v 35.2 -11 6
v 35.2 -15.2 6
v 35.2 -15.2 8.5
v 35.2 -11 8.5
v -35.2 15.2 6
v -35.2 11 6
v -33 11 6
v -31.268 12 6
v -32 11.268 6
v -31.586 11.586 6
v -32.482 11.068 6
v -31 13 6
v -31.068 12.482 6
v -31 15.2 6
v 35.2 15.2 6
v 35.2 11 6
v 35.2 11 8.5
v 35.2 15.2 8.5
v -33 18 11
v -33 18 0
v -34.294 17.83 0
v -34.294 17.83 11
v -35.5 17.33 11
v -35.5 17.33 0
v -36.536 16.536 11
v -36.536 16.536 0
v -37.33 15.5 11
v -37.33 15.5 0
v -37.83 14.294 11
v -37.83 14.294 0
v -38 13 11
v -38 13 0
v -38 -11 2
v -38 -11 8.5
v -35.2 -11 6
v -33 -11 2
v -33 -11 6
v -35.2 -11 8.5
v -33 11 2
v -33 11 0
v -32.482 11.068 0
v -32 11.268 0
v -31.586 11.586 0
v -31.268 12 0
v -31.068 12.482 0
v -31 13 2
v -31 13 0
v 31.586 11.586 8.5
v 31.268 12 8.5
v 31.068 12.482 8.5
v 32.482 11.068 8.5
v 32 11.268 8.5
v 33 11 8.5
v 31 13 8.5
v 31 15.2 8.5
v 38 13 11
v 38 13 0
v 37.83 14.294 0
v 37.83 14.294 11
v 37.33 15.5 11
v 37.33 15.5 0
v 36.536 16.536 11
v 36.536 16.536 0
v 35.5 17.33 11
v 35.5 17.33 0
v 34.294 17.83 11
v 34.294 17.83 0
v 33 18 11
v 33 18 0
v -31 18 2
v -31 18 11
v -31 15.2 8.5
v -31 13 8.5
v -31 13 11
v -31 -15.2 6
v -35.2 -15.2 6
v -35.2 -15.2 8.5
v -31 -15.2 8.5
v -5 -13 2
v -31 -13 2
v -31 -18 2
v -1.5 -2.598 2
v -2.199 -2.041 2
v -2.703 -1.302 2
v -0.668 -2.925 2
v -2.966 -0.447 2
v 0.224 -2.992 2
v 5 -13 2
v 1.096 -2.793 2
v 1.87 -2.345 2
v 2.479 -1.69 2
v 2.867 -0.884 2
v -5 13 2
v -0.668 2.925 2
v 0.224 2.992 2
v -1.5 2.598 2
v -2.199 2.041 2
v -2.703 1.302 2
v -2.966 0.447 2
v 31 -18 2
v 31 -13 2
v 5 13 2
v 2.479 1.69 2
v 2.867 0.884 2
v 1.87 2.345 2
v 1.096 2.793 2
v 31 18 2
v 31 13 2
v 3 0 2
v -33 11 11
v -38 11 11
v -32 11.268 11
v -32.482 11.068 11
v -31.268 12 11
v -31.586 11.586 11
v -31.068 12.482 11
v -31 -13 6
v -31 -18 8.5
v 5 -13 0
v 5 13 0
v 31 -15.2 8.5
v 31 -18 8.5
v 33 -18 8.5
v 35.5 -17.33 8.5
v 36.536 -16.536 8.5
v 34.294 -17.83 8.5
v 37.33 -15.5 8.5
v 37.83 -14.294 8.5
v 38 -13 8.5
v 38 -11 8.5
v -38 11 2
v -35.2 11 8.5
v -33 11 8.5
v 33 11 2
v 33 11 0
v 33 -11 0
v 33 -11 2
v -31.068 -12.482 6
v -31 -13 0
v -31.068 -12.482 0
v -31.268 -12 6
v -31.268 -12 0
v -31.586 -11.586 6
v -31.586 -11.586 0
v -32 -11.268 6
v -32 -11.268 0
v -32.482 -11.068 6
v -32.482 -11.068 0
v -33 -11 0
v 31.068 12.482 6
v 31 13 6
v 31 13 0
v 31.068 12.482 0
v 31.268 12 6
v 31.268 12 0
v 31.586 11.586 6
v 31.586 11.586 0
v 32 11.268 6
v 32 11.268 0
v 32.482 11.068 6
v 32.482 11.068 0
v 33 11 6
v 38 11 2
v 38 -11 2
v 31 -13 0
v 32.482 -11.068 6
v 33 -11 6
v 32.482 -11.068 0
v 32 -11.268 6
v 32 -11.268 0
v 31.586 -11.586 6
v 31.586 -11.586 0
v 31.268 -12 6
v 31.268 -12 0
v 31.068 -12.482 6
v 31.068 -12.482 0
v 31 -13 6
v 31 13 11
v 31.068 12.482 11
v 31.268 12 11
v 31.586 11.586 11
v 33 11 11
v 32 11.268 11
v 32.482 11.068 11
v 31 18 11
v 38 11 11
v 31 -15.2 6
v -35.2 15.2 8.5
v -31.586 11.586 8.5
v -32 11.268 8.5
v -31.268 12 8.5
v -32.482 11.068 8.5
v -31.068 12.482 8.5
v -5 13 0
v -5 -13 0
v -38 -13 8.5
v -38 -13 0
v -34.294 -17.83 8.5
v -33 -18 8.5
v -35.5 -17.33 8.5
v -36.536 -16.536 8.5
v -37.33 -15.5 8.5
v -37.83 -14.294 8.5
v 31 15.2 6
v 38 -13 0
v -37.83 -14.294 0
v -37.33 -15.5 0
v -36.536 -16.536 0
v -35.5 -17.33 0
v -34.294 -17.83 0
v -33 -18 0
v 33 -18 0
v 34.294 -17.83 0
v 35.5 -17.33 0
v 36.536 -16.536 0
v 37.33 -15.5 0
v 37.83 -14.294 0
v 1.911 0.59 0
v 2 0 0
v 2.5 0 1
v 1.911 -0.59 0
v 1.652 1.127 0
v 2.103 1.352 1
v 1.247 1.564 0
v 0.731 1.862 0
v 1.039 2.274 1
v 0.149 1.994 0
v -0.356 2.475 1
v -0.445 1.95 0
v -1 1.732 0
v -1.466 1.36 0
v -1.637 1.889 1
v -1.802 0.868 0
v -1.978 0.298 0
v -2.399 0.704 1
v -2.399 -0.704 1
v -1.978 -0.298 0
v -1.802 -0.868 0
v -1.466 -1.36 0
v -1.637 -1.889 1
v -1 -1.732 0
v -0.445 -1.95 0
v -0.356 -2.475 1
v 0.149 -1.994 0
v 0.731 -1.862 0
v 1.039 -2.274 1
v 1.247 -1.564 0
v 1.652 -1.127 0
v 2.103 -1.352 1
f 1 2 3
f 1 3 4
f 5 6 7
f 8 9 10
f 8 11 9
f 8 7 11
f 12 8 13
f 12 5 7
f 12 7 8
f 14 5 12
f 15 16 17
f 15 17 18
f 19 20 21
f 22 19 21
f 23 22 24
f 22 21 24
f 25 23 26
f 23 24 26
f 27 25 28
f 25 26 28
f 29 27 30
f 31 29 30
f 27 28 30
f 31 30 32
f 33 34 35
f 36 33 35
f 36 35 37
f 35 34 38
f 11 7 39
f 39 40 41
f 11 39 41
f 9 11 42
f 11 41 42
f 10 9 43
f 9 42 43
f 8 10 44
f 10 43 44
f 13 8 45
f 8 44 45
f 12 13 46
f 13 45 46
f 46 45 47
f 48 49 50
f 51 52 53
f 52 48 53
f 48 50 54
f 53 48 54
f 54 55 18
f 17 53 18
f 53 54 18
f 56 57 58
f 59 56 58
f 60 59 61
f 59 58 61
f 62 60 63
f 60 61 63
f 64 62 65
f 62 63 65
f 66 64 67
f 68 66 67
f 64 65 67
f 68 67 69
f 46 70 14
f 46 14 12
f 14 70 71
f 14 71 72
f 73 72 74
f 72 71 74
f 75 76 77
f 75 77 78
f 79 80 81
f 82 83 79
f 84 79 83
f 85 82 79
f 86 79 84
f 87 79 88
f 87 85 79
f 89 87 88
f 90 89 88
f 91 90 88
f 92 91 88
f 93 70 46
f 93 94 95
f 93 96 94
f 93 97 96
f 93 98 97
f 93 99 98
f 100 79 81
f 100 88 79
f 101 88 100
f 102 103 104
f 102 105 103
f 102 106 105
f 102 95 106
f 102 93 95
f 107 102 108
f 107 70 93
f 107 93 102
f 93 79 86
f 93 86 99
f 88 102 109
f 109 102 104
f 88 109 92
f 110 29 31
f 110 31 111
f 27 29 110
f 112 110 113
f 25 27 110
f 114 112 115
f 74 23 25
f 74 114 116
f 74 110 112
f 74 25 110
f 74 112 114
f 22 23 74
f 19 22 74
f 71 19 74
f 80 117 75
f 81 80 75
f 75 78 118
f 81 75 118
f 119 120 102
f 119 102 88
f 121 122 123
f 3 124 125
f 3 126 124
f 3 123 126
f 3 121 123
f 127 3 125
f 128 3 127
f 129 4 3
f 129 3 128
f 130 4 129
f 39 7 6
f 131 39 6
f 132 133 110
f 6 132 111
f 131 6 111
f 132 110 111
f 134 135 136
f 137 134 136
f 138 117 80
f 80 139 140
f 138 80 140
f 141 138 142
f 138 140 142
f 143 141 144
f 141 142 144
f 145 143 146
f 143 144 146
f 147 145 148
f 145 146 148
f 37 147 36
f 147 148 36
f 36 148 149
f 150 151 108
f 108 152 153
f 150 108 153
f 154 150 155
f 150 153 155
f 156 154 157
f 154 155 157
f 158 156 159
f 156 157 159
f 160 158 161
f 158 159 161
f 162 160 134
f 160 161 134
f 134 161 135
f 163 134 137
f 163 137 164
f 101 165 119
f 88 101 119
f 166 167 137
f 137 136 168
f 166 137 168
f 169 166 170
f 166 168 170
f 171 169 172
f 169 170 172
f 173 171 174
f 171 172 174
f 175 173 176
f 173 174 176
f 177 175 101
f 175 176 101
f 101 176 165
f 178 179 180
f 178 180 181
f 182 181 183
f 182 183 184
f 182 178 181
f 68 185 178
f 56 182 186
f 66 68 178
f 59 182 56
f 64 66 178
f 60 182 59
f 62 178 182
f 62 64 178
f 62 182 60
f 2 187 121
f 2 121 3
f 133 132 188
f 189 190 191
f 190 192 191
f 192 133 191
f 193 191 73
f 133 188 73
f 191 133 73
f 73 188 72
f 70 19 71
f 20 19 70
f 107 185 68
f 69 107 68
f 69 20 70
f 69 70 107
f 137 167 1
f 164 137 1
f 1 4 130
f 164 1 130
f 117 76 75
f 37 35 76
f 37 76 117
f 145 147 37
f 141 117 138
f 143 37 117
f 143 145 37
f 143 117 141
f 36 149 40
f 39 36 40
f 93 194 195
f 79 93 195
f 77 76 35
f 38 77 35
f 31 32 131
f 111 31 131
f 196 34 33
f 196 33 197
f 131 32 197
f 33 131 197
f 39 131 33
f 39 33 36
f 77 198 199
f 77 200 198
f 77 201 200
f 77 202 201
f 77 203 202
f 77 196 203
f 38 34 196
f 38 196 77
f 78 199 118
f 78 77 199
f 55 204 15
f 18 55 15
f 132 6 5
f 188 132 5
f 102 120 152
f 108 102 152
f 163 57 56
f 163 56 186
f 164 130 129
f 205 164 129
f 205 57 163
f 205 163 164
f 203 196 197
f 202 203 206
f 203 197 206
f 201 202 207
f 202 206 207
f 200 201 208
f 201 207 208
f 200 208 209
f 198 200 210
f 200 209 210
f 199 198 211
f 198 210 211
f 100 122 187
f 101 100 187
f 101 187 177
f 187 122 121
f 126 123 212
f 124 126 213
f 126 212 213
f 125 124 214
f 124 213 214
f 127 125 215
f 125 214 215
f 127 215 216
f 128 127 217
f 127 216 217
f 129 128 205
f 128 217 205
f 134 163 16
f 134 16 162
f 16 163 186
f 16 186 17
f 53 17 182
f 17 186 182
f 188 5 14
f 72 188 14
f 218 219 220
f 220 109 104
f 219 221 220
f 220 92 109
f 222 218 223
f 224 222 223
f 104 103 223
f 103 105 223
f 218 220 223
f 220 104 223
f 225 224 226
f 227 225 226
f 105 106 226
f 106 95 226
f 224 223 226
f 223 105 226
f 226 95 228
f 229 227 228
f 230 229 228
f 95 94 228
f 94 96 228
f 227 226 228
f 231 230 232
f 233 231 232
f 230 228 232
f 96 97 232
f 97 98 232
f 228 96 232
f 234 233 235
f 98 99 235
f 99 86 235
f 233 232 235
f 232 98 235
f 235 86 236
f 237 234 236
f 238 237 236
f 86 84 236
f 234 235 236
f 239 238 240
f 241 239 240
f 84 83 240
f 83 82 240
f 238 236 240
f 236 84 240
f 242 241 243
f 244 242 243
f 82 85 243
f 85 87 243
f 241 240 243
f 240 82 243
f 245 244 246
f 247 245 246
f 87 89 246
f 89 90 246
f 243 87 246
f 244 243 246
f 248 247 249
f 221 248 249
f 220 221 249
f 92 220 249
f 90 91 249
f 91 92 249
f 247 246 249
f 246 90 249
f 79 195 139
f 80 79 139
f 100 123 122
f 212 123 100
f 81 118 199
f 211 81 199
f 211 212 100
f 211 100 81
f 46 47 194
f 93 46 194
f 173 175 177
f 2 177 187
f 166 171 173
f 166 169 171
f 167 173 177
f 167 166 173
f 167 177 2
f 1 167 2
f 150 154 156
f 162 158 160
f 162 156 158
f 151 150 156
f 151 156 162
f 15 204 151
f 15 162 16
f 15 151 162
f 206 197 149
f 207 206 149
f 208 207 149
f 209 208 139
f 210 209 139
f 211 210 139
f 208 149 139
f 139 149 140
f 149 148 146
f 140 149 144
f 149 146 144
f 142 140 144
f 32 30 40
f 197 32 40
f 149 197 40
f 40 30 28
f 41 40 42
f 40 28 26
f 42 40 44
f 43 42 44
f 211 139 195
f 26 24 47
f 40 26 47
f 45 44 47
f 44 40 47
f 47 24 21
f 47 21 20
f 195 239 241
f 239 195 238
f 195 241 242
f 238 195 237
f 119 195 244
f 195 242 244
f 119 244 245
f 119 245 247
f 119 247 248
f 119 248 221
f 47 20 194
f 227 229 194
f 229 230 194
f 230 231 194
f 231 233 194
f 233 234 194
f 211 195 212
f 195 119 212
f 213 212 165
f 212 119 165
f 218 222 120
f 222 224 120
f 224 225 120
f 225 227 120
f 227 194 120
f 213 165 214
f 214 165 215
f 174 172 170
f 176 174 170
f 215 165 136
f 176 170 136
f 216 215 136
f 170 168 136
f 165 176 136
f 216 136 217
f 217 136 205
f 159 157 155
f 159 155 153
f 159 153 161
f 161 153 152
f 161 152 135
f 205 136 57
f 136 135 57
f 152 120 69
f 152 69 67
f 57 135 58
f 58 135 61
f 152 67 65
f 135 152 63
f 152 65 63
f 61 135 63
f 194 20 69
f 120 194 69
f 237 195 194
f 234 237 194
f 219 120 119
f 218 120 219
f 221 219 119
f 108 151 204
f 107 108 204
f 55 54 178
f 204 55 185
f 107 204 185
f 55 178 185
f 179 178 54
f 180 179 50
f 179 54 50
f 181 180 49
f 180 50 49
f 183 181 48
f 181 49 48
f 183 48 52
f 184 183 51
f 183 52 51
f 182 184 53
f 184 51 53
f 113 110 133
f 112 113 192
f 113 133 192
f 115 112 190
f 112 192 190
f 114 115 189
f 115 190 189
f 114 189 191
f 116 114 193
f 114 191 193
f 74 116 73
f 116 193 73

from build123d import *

# Parameters (mm, degrees)
PAD084_DEPTH    = 11
POCKET032_DEPTH = 10
SKETCH143_W     = 70.4
SKETCH143_H     = 30.4
POCKET033_DEPTH = 2.5
SKETCH144_R     = 5.5
POCKET034_DEPTH = 2.5


with BuildPart() as part:
    # Sketch141 → Pad084 (new body)
    with BuildSketch(Plane.XY):
        with BuildLine():
            ThreePointArc((-33, 18), (-36.535534, 16.535534), (-38, 13))
            Line((-38, 13), (-38, -13))
            ThreePointArc((-38, -13), (-36.535534, -16.535534), (-33, -18))
            Line((33, -18), (-33, -18))
            ThreePointArc((33, -18), (36.535534, -16.535534), (38, -13))
            Line((38, 13), (38, -13))
            ThreePointArc((38, 13), (36.535534, 16.535534), (33, 18))
            Line((-33, 18), (33, 18))
        make_face()
        with BuildLine():
            ThreePointArc((-33, 11), (-31.585786, 11.585786), (-31, 13))
            Line((-31, 13), (-5, 13))
            Line((-5, 13), (-5, -13))
            Line((-5, -13), (-31, -13))
            ThreePointArc((-31, -13), (-31.585786, -11.585786), (-33, -11))
            Line((-33, -11), (-33, 11))
        make_face(mode=Mode.SUBTRACT)
        with BuildLine():
            ThreePointArc((31, 13), (31.585786, 11.585786), (33, 11))
            Line((33, 11), (33, -11))
            ThreePointArc((33, -11), (31.585786, -11.585786), (31, -13))
            Line((31, -13), (5, -13))
            Line((5, 13), (5, -13))
            Line((5, 13), (31, 13))
        make_face(mode=Mode.SUBTRACT)
    extrude(amount=PAD084_DEPTH)

    # Sketch142 → Pocket032 (cut)
    with BuildSketch(Plane.XY.offset(12)):
        Polygon((-31, 18), (-31, 11), (-38, 11), (-38, -11), (-31, -11), (-31, -18), (31, -18), (31, -11), (38, -11), (38, 11), (31, 11), (31, 18), align=None)
    extrude(amount=-POCKET032_DEPTH, mode=Mode.SUBTRACT)

    # Sketch143 → Pocket033 (cut)
    with BuildSketch(Plane.XY.offset(6)):
        Rectangle(SKETCH143_W, SKETCH143_H)
    extrude(amount=POCKET033_DEPTH, mode=Mode.SUBTRACT)

    # Sketch144 → Pocket034 (cut)
    with BuildSketch(Plane.XY.offset(11)):
        with Locations((-33, -13)):
            Circle(SKETCH144_R)
        with Locations((33, -13)):
            Circle(SKETCH144_R)
    extrude(amount=-POCKET034_DEPTH, mode=Mode.SUBTRACT)

    # Cone008 → Cone008 (revolve, cut)
    with BuildSketch(Plane.XZ):
        Polygon((0, 0), (2, 0), (3, 2), (0, 2), align=None)
    revolve(axis=Axis((0, 0, 0), (0, 0, 1)), mode=Mode.SUBTRACT)


solid = part.part
